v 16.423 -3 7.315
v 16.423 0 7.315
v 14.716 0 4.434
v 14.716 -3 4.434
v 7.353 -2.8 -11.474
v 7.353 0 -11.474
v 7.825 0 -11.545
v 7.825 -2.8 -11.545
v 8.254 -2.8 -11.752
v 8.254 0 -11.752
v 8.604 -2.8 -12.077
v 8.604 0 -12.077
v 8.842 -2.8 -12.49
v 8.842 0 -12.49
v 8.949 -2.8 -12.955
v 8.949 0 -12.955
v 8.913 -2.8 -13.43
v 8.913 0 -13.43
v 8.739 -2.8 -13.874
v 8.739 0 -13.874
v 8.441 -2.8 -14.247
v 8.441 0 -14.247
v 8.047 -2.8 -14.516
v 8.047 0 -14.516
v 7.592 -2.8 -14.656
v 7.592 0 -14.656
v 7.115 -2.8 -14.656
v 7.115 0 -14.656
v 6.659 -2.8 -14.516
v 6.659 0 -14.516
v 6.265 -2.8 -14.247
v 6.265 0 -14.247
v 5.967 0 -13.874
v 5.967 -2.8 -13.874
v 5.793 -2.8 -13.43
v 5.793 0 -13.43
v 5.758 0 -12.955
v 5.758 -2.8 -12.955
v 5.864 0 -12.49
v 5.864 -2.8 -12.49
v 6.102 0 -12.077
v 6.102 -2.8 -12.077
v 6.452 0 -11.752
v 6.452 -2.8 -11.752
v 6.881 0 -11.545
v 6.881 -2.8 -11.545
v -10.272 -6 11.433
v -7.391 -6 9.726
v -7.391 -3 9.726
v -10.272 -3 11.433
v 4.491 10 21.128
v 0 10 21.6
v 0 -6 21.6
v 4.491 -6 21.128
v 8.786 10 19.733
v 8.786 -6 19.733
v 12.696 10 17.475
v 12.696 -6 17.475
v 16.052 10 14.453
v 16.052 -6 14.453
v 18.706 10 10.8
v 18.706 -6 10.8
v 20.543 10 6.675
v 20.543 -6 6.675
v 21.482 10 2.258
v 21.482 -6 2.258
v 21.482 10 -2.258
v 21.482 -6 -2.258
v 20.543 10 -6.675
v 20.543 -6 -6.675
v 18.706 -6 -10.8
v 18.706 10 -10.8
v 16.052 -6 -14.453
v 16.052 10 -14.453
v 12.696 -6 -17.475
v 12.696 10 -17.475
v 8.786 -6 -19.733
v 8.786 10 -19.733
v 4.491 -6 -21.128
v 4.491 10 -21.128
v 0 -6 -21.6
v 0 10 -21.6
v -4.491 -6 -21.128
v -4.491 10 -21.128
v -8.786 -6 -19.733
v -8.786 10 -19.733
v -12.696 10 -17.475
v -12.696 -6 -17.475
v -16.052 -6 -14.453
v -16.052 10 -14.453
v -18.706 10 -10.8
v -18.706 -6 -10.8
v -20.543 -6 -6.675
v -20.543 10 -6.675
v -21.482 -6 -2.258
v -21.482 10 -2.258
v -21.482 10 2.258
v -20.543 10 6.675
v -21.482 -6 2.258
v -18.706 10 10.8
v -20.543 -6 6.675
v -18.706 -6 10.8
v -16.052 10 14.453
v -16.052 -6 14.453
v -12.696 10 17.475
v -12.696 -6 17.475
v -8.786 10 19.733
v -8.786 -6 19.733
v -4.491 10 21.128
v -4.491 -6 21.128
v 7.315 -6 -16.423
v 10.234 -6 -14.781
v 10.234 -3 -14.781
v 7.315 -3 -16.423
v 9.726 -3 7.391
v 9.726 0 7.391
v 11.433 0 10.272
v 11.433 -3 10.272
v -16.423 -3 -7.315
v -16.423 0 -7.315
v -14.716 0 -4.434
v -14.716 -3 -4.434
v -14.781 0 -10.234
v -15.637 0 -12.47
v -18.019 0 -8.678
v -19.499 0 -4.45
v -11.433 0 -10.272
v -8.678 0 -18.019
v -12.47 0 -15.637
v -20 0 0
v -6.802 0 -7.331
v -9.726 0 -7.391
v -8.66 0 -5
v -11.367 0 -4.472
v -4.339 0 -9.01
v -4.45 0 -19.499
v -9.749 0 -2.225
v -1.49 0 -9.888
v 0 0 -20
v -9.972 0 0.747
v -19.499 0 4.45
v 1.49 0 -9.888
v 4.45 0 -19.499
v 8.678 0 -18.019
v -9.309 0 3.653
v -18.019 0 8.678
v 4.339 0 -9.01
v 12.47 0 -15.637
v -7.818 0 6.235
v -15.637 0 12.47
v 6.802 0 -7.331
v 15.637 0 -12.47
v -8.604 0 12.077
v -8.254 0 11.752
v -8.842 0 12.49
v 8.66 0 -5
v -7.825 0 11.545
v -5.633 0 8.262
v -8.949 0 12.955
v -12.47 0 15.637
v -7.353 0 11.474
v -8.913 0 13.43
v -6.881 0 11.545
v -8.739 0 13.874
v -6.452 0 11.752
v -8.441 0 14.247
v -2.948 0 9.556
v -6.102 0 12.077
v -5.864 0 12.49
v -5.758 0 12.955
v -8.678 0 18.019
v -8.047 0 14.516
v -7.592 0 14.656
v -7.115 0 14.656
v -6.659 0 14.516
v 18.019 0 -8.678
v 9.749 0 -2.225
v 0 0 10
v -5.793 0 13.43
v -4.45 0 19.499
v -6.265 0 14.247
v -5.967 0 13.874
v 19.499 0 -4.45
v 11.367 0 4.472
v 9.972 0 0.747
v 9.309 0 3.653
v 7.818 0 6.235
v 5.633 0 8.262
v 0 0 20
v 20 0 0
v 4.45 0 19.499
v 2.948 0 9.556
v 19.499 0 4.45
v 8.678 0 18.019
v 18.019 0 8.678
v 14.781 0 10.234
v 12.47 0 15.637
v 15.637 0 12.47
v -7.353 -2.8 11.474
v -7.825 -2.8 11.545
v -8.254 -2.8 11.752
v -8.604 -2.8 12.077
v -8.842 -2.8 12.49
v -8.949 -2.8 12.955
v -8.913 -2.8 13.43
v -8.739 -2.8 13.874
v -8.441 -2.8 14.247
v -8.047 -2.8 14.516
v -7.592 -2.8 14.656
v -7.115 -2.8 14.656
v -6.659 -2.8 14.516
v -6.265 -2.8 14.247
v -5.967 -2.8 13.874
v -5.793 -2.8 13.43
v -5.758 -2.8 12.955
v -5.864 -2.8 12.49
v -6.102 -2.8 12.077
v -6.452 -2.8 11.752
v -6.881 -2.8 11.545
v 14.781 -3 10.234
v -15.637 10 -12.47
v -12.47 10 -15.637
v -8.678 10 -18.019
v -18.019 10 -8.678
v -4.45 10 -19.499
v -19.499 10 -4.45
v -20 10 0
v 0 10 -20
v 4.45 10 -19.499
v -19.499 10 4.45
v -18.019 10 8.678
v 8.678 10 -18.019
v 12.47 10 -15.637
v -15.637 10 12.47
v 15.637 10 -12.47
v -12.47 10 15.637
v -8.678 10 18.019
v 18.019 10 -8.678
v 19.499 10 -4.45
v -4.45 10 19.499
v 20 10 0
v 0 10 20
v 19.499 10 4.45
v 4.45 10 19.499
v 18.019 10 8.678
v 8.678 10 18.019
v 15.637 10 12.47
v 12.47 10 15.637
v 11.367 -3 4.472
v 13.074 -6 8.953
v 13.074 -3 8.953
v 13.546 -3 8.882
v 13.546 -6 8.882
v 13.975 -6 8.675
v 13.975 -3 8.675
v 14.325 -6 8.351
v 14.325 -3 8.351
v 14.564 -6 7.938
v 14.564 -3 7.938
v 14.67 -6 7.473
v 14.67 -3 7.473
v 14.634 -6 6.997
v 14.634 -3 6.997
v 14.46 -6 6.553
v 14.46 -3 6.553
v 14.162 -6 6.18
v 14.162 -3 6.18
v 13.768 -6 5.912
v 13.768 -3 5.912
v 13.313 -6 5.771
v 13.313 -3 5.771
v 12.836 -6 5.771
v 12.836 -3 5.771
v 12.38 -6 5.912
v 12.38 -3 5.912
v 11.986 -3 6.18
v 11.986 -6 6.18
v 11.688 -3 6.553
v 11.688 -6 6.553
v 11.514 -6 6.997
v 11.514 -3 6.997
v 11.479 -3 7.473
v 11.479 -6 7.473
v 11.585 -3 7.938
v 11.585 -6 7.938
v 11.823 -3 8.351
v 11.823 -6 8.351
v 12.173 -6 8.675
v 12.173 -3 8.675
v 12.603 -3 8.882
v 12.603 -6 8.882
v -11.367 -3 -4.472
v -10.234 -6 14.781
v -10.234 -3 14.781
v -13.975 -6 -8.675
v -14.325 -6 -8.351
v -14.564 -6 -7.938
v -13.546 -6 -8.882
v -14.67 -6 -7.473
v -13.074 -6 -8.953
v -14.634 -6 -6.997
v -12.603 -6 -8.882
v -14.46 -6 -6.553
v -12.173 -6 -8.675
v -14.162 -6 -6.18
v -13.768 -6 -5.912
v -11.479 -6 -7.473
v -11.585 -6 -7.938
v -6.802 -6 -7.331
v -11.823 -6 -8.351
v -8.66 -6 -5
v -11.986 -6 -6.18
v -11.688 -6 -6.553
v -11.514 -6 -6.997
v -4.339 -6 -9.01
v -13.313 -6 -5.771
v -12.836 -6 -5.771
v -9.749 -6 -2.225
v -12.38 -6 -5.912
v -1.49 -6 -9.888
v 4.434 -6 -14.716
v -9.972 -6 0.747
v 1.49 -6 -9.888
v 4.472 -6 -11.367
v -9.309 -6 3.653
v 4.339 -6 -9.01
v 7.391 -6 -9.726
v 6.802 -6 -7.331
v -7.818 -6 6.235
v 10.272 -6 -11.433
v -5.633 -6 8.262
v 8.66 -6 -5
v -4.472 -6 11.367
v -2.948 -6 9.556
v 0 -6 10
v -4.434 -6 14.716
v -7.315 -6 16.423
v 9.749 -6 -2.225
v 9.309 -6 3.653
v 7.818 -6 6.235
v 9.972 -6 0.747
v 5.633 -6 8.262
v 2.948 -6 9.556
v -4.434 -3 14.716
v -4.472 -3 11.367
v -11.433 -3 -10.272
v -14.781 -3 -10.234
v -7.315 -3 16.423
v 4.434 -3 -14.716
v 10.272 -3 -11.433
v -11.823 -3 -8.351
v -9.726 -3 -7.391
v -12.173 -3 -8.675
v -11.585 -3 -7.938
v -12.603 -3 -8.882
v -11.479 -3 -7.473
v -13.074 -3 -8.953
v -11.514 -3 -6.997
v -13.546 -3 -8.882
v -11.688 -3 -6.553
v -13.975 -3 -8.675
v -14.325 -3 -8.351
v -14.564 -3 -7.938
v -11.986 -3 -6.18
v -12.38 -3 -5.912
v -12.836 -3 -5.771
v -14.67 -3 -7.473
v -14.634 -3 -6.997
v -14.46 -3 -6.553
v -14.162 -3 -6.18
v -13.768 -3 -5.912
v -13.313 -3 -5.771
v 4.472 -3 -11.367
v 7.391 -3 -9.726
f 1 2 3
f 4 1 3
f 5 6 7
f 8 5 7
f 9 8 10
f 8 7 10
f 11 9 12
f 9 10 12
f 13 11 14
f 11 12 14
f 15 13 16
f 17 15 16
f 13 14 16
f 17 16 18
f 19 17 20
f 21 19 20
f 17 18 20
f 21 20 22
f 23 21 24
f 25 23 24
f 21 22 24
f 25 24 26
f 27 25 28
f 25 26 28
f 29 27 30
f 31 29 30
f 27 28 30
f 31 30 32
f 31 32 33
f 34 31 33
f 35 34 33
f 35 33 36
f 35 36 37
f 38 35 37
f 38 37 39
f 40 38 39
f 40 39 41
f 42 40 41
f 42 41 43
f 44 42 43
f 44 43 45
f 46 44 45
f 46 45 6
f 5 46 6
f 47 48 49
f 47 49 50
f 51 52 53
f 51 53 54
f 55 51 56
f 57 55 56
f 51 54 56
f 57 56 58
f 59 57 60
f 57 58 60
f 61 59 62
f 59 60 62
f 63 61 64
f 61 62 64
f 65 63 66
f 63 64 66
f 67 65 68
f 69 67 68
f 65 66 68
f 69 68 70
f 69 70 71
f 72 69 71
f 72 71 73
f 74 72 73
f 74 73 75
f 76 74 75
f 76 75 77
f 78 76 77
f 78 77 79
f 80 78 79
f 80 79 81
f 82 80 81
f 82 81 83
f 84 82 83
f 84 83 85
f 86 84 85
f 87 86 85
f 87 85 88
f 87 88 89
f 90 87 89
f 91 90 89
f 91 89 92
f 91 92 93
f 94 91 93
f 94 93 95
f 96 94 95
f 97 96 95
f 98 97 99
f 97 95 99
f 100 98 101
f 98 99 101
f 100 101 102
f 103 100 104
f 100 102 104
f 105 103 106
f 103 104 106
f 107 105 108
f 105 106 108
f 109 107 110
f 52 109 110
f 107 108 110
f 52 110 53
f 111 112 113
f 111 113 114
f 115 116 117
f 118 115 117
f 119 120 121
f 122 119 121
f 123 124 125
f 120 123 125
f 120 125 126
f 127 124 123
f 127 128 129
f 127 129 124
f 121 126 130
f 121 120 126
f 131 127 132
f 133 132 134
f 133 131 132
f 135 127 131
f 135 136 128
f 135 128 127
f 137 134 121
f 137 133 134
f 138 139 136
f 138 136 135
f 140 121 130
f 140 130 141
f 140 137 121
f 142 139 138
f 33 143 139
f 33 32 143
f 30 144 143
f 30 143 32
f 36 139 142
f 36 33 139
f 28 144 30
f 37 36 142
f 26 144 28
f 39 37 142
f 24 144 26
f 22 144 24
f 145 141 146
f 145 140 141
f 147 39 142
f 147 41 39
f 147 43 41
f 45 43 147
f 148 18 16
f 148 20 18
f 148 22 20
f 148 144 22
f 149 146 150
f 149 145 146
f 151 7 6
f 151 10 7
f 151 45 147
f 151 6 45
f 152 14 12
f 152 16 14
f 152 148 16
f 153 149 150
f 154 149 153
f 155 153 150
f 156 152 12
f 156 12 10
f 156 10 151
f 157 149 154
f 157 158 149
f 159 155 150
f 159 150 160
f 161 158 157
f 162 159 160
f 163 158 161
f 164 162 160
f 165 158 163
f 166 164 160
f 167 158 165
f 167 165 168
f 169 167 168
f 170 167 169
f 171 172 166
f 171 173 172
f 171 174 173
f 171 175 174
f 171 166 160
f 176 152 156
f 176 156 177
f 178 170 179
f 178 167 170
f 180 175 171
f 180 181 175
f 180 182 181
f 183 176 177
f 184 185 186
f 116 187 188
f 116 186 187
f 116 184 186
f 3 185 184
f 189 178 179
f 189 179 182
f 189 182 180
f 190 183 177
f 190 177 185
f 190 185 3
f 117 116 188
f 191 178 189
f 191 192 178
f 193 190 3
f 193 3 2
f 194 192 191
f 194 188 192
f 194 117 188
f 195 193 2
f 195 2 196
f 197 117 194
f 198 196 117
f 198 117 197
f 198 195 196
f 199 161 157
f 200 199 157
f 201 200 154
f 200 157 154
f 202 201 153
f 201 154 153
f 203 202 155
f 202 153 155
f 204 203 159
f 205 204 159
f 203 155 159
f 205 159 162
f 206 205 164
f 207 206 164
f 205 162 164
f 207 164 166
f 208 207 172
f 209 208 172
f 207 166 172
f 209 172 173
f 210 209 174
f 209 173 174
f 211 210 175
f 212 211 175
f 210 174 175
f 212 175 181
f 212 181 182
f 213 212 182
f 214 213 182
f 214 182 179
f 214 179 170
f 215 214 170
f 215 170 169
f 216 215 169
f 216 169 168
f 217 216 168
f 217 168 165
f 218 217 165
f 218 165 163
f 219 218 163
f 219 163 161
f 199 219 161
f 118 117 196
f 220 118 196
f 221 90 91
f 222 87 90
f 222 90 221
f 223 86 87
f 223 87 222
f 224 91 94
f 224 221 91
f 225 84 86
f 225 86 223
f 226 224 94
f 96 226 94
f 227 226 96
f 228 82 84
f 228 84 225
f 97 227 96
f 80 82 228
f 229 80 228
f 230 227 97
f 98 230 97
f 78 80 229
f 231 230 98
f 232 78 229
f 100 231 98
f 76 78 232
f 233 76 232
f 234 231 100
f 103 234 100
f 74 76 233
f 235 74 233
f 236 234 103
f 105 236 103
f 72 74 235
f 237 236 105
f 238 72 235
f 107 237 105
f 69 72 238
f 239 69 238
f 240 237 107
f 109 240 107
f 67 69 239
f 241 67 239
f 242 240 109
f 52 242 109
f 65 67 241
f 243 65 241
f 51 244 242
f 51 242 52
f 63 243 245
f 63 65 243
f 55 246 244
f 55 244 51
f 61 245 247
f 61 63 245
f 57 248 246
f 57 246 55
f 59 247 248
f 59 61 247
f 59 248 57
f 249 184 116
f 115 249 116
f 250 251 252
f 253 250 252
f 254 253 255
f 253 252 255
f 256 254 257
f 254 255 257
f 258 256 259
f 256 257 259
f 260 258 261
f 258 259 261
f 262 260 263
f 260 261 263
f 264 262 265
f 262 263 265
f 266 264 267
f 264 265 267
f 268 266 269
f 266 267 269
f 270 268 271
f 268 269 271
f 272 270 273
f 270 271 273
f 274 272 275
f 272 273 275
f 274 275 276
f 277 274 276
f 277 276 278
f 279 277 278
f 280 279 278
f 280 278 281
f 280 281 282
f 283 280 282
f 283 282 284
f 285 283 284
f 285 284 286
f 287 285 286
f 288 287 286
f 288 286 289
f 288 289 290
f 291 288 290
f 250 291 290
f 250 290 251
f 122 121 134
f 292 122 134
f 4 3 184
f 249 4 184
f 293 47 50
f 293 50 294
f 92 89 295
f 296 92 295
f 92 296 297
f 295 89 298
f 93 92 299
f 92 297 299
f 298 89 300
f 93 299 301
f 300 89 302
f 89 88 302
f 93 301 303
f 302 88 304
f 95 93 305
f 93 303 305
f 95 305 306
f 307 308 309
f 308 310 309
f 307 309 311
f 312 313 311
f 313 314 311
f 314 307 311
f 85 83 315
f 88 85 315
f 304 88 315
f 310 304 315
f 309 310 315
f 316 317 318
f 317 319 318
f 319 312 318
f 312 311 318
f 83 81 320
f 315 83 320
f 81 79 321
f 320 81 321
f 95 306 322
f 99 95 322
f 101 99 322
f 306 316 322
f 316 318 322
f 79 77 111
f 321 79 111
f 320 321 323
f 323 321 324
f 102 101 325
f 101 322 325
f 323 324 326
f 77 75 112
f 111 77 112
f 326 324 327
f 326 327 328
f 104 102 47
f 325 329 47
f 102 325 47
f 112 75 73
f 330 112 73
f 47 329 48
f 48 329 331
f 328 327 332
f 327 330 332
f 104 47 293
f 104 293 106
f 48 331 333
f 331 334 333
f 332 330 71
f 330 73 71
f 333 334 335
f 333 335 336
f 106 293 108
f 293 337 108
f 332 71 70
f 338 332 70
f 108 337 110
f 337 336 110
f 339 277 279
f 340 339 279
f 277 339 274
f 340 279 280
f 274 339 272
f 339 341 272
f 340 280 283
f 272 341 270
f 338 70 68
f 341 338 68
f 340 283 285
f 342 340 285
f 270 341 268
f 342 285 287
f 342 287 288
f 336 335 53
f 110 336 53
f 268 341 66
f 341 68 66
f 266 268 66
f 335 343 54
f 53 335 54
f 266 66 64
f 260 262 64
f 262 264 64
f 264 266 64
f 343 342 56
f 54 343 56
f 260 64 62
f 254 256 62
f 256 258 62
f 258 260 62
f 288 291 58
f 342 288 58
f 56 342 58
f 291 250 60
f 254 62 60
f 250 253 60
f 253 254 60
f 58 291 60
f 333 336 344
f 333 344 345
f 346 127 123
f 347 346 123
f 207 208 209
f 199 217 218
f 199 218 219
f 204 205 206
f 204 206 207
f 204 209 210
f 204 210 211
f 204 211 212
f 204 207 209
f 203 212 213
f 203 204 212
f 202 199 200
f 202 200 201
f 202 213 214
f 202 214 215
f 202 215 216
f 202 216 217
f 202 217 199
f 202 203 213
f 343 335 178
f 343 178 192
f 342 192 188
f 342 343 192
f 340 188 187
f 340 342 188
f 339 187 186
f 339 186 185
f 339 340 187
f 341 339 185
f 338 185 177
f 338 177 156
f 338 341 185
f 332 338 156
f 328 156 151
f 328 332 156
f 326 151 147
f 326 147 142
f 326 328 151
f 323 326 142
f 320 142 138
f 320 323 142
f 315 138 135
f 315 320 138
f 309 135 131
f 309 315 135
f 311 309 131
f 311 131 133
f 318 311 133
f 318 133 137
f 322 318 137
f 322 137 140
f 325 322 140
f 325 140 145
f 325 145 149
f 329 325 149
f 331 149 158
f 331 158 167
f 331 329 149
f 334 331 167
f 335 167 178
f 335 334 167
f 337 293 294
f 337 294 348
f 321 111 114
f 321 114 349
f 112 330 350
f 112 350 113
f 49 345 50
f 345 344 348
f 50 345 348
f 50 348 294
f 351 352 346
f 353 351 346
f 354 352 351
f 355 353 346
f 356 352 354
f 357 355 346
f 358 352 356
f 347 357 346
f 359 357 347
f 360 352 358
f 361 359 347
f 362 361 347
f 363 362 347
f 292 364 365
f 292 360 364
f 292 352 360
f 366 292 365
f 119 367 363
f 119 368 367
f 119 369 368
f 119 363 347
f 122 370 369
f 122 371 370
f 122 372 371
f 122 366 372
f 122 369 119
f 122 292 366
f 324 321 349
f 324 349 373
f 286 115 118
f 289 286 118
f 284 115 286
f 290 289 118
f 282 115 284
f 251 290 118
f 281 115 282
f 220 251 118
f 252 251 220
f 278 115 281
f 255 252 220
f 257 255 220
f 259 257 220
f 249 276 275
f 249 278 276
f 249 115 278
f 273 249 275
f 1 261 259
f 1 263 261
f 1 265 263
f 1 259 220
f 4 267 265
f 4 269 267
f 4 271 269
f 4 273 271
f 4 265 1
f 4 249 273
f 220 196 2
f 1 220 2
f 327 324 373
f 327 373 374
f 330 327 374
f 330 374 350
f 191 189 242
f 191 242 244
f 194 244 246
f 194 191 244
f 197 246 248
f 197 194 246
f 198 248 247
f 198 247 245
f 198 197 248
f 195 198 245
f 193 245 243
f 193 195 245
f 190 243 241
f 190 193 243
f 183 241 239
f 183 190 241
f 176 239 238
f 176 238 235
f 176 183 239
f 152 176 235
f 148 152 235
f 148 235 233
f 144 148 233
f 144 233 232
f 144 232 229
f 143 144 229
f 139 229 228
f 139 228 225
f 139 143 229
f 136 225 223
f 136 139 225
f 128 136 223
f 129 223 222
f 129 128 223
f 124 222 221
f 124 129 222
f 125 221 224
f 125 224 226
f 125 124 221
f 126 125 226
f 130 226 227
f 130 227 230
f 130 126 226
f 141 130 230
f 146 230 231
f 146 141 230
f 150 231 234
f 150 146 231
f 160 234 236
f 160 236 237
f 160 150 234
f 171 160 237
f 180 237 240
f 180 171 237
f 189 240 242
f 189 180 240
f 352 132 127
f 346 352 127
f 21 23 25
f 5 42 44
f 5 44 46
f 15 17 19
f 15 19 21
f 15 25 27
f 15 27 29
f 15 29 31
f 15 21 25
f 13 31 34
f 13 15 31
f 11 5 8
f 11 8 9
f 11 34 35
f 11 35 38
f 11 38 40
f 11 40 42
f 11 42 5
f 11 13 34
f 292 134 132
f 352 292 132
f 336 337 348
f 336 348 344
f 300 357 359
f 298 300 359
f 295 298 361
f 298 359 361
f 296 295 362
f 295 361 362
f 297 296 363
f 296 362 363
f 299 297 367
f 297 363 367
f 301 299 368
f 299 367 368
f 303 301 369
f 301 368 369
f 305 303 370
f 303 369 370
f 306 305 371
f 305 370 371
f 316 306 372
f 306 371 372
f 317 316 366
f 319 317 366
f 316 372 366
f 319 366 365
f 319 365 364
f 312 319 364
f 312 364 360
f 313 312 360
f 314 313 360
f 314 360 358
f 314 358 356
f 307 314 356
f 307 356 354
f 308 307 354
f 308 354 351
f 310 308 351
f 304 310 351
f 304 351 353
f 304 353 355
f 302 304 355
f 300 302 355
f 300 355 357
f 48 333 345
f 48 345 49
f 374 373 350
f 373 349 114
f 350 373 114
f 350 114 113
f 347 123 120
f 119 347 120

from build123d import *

# Parameters (mm, degrees)
SKETCH1_R           = 21.6
SKETCH1_R_2         = 20
BOSS_EXTRUDE1_DEPTH = 10
BOSS_EXTRUDE2_START = -6
SKETCH1_3_R         = 21.6
SKETCH1_3_R_2       = 20
SKETCH1_3_R_3       = 10
SKETCH1_3_R_4       = 1.6
BOSS_EXTRUDE2_DEPTH = 6
SKETCH1_5_R         = 1.6
CUT_EXTRUDE2_DEPTH  = 33.14218412
CUT_EXTRUDE1_START  = -6
CUT_EXTRUDE1_DEPTH  = 3
BOSS_EXTRUDE3_START = -2.8
SKETCH1_6_R         = 1.6
BOSS_EXTRUDE3_DEPTH = 0.2
CIRPATTERN2_COUNT   = 2
SKETCH3_R           = 1.6
CUT_EXTRUDE4_DEPTH  = 33.14218412
SKETCH3_3_R         = 1.6
CUT_EXTRUDE5_DEPTH  = 3
CIRPATTERN3_COUNT   = 2


with BuildPart() as part:
    # Sketch1 → Boss-Extrude1 (new body)
    with BuildSketch(Plane(origin=(0, 0, 0), x_dir=(1, 0, 0), z_dir=(0, 1, 0))):
        with Locations(Location((0, 0, 0), (0, 0, 270))):
            Circle(SKETCH1_R)
        with Locations(Location((0, 0, 0), (0, 0, 270))):
            Circle(SKETCH1_R_2, mode=Mode.SUBTRACT)
    extrude(amount=BOSS_EXTRUDE1_DEPTH)

    # Sketch1<3> → Boss-Extrude2 (add)
    # profile 1 of 4: a face of its own
    with BuildSketch(Plane(origin=(0, 0, 0), x_dir=(1, 0, 0), z_dir=(0, 1, 0)).offset(BOSS_EXTRUDE2_START)):
        with Locations(Location((0, 0, 0), (0, 0, 270))):
            Circle(SKETCH1_3_R)
        with Locations(Location((0, 0, 0), (0, 0, 270))):
            Circle(SKETCH1_3_R_2, mode=Mode.SUBTRACT)
    # profile 2 of 4: a face of its own
    with BuildSketch(Plane(origin=(0, 0, 0), x_dir=(1, 0, 0), z_dir=(0, 1, 0)).offset(BOSS_EXTRUDE2_START)):
        with Locations(Location((0, 0, 0), (0, 0, 270))):
            Circle(SKETCH1_3_R_2)
        with Locations(Location((0, 0, 0), (0, 0, 270))):
            Circle(SKETCH1_3_R_3, mode=Mode.SUBTRACT)
        Polygon((10.271761873, 11.432595565), (10.234009445, 14.78101431), (7.315317535, 16.42252912), (4.434378054, 14.715625186), (4.472130483, 11.367206441), (7.390822392, 9.725691631), align=None, mode=Mode.SUBTRACT)
    # profile 3 of 4: a face of its own
    with BuildSketch(Plane(origin=(0, 0, 0), x_dir=(1, 0, 0), z_dir=(0, 1, 0)).offset(BOSS_EXTRUDE2_START)):
        Polygon((7.390822392, 9.725691631), (10.271761873, 11.432595565), (10.234009445, 14.78101431), (7.315317535, 16.42252912), (4.434378054, 14.715625186), (4.472130483, 11.367206441), align=None)
        with Locations((7.353069964, 13.074110375)):
            Circle(SKETCH1_3_R_4, mode=Mode.SUBTRACT)
    # profile 4 of 4: a face of its own
    with BuildSketch(Plane(origin=(0, 0, 0), x_dir=(1, 0, 0), z_dir=(0, 1, 0)).offset(BOSS_EXTRUDE2_START)):
        with Locations((7.353069964, 13.074110375)):
            Circle(SKETCH1_3_R_4)
    extrude(amount=BOSS_EXTRUDE2_DEPTH)

    # Sketch1<5> → Cut-Extrude2 (cut, through all)
    with BuildSketch(Plane(origin=(0, 0, 0), x_dir=(1, 0, 0), z_dir=(0, 1, 0))):
        with Locations(Location((7.353069964, 13.074110375, 0), (0, 0, 270))):
            Circle(SKETCH1_5_R)
    cut_extrude2 = extrude(amount=-CUT_EXTRUDE2_DEPTH, mode=Mode.SUBTRACT)

    # Sketch1<4> → Cut-Extrude1 (cut)
    with BuildSketch(Plane(origin=(0, 0, 0), x_dir=(1, 0, 0), z_dir=(0, 1, 0)).offset(CUT_EXTRUDE1_START)):
        Polygon((10.234009445, 14.78101431), (7.315317535, 16.42252912), (4.434378054, 14.715625186), (4.472130483, 11.367206441), (7.390822392, 9.725691631), (10.271761873, 11.432595565), align=None)
    cut_extrude1 = extrude(amount=CUT_EXTRUDE1_DEPTH, mode=Mode.SUBTRACT)

    # Sketch1<6> → Boss-Extrude3 (add)
    with BuildSketch(Plane(origin=(0, 0, 0), x_dir=(1, 0, 0), z_dir=(0, 1, 0)).offset(BOSS_EXTRUDE3_START)):
        with Locations(Location((7.353069964, 13.074110375, 0), (0, 0, 270))):
            Circle(SKETCH1_6_R)
    boss_extrude3 = extrude(amount=-BOSS_EXTRUDE3_DEPTH)

    # CirPattern2: Cut-Extrude2, Cut-Extrude1, Boss-Extrude3 ×2 about axis
    cirpattern2_axis = Axis((0, 0, 0), (0, 1, 0))
    add([cut_extrude2.rotate(cirpattern2_axis, i * 360 / CIRPATTERN2_COUNT) for i in range(1, CIRPATTERN2_COUNT)], mode=Mode.SUBTRACT)
    add([cut_extrude1.rotate(cirpattern2_axis, i * 360 / CIRPATTERN2_COUNT) for i in range(1, CIRPATTERN2_COUNT)], mode=Mode.SUBTRACT)
    add([boss_extrude3.rotate(cirpattern2_axis, i * 360 / CIRPATTERN2_COUNT) for i in range(1, CIRPATTERN2_COUNT)])

    # Sketch3 → Cut-Extrude4 (cut, through all)
    with BuildSketch(Plane(origin=(0, 0, 0), x_dir=(1, 0, 0), z_dir=(0, 1, 0))):
        with Locations(Location((13.074110375, -7.353069964, 0), (0, 0, 270))):
            Circle(SKETCH3_R)
    cut_extrude4 = extrude(amount=-CUT_EXTRUDE4_DEPTH, mode=Mode.SUBTRACT)

    # Sketch3<3> → Cut-Extrude5 (cut)
    with BuildSketch(Plane(origin=(0, 0, 0), x_dir=(1, 0, 0), z_dir=(0, 1, 0))):
        Polygon((14.715625186, -4.434378054), (11.367206441, -4.472130483), (9.725691631, -7.390822392), (11.432595565, -10.271761873), (14.78101431, -10.234009445), (16.42252912, -7.315317535), align=None)
        with Locations(Location((13.074110375, -7.353069964, 0), (0, 0, 270))):
            Circle(SKETCH3_3_R, mode=Mode.SUBTRACT)
    cut_extrude5 = extrude(amount=-CUT_EXTRUDE5_DEPTH, mode=Mode.SUBTRACT)

    # CirPattern3: Cut-Extrude4, Cut-Extrude5 ×2 about axis
    cirpattern3_axis = Axis((0, 0, 0), (0, 1, 0))
    add([cut_extrude4.rotate(cirpattern3_axis, i * 360 / CIRPATTERN3_COUNT) for i in range(1, CIRPATTERN3_COUNT)], mode=Mode.SUBTRACT)
    add([cut_extrude5.rotate(cirpattern3_axis, i * 360 / CIRPATTERN3_COUNT) for i in range(1, CIRPATTERN3_COUNT)], mode=Mode.SUBTRACT)


solid = part.part
